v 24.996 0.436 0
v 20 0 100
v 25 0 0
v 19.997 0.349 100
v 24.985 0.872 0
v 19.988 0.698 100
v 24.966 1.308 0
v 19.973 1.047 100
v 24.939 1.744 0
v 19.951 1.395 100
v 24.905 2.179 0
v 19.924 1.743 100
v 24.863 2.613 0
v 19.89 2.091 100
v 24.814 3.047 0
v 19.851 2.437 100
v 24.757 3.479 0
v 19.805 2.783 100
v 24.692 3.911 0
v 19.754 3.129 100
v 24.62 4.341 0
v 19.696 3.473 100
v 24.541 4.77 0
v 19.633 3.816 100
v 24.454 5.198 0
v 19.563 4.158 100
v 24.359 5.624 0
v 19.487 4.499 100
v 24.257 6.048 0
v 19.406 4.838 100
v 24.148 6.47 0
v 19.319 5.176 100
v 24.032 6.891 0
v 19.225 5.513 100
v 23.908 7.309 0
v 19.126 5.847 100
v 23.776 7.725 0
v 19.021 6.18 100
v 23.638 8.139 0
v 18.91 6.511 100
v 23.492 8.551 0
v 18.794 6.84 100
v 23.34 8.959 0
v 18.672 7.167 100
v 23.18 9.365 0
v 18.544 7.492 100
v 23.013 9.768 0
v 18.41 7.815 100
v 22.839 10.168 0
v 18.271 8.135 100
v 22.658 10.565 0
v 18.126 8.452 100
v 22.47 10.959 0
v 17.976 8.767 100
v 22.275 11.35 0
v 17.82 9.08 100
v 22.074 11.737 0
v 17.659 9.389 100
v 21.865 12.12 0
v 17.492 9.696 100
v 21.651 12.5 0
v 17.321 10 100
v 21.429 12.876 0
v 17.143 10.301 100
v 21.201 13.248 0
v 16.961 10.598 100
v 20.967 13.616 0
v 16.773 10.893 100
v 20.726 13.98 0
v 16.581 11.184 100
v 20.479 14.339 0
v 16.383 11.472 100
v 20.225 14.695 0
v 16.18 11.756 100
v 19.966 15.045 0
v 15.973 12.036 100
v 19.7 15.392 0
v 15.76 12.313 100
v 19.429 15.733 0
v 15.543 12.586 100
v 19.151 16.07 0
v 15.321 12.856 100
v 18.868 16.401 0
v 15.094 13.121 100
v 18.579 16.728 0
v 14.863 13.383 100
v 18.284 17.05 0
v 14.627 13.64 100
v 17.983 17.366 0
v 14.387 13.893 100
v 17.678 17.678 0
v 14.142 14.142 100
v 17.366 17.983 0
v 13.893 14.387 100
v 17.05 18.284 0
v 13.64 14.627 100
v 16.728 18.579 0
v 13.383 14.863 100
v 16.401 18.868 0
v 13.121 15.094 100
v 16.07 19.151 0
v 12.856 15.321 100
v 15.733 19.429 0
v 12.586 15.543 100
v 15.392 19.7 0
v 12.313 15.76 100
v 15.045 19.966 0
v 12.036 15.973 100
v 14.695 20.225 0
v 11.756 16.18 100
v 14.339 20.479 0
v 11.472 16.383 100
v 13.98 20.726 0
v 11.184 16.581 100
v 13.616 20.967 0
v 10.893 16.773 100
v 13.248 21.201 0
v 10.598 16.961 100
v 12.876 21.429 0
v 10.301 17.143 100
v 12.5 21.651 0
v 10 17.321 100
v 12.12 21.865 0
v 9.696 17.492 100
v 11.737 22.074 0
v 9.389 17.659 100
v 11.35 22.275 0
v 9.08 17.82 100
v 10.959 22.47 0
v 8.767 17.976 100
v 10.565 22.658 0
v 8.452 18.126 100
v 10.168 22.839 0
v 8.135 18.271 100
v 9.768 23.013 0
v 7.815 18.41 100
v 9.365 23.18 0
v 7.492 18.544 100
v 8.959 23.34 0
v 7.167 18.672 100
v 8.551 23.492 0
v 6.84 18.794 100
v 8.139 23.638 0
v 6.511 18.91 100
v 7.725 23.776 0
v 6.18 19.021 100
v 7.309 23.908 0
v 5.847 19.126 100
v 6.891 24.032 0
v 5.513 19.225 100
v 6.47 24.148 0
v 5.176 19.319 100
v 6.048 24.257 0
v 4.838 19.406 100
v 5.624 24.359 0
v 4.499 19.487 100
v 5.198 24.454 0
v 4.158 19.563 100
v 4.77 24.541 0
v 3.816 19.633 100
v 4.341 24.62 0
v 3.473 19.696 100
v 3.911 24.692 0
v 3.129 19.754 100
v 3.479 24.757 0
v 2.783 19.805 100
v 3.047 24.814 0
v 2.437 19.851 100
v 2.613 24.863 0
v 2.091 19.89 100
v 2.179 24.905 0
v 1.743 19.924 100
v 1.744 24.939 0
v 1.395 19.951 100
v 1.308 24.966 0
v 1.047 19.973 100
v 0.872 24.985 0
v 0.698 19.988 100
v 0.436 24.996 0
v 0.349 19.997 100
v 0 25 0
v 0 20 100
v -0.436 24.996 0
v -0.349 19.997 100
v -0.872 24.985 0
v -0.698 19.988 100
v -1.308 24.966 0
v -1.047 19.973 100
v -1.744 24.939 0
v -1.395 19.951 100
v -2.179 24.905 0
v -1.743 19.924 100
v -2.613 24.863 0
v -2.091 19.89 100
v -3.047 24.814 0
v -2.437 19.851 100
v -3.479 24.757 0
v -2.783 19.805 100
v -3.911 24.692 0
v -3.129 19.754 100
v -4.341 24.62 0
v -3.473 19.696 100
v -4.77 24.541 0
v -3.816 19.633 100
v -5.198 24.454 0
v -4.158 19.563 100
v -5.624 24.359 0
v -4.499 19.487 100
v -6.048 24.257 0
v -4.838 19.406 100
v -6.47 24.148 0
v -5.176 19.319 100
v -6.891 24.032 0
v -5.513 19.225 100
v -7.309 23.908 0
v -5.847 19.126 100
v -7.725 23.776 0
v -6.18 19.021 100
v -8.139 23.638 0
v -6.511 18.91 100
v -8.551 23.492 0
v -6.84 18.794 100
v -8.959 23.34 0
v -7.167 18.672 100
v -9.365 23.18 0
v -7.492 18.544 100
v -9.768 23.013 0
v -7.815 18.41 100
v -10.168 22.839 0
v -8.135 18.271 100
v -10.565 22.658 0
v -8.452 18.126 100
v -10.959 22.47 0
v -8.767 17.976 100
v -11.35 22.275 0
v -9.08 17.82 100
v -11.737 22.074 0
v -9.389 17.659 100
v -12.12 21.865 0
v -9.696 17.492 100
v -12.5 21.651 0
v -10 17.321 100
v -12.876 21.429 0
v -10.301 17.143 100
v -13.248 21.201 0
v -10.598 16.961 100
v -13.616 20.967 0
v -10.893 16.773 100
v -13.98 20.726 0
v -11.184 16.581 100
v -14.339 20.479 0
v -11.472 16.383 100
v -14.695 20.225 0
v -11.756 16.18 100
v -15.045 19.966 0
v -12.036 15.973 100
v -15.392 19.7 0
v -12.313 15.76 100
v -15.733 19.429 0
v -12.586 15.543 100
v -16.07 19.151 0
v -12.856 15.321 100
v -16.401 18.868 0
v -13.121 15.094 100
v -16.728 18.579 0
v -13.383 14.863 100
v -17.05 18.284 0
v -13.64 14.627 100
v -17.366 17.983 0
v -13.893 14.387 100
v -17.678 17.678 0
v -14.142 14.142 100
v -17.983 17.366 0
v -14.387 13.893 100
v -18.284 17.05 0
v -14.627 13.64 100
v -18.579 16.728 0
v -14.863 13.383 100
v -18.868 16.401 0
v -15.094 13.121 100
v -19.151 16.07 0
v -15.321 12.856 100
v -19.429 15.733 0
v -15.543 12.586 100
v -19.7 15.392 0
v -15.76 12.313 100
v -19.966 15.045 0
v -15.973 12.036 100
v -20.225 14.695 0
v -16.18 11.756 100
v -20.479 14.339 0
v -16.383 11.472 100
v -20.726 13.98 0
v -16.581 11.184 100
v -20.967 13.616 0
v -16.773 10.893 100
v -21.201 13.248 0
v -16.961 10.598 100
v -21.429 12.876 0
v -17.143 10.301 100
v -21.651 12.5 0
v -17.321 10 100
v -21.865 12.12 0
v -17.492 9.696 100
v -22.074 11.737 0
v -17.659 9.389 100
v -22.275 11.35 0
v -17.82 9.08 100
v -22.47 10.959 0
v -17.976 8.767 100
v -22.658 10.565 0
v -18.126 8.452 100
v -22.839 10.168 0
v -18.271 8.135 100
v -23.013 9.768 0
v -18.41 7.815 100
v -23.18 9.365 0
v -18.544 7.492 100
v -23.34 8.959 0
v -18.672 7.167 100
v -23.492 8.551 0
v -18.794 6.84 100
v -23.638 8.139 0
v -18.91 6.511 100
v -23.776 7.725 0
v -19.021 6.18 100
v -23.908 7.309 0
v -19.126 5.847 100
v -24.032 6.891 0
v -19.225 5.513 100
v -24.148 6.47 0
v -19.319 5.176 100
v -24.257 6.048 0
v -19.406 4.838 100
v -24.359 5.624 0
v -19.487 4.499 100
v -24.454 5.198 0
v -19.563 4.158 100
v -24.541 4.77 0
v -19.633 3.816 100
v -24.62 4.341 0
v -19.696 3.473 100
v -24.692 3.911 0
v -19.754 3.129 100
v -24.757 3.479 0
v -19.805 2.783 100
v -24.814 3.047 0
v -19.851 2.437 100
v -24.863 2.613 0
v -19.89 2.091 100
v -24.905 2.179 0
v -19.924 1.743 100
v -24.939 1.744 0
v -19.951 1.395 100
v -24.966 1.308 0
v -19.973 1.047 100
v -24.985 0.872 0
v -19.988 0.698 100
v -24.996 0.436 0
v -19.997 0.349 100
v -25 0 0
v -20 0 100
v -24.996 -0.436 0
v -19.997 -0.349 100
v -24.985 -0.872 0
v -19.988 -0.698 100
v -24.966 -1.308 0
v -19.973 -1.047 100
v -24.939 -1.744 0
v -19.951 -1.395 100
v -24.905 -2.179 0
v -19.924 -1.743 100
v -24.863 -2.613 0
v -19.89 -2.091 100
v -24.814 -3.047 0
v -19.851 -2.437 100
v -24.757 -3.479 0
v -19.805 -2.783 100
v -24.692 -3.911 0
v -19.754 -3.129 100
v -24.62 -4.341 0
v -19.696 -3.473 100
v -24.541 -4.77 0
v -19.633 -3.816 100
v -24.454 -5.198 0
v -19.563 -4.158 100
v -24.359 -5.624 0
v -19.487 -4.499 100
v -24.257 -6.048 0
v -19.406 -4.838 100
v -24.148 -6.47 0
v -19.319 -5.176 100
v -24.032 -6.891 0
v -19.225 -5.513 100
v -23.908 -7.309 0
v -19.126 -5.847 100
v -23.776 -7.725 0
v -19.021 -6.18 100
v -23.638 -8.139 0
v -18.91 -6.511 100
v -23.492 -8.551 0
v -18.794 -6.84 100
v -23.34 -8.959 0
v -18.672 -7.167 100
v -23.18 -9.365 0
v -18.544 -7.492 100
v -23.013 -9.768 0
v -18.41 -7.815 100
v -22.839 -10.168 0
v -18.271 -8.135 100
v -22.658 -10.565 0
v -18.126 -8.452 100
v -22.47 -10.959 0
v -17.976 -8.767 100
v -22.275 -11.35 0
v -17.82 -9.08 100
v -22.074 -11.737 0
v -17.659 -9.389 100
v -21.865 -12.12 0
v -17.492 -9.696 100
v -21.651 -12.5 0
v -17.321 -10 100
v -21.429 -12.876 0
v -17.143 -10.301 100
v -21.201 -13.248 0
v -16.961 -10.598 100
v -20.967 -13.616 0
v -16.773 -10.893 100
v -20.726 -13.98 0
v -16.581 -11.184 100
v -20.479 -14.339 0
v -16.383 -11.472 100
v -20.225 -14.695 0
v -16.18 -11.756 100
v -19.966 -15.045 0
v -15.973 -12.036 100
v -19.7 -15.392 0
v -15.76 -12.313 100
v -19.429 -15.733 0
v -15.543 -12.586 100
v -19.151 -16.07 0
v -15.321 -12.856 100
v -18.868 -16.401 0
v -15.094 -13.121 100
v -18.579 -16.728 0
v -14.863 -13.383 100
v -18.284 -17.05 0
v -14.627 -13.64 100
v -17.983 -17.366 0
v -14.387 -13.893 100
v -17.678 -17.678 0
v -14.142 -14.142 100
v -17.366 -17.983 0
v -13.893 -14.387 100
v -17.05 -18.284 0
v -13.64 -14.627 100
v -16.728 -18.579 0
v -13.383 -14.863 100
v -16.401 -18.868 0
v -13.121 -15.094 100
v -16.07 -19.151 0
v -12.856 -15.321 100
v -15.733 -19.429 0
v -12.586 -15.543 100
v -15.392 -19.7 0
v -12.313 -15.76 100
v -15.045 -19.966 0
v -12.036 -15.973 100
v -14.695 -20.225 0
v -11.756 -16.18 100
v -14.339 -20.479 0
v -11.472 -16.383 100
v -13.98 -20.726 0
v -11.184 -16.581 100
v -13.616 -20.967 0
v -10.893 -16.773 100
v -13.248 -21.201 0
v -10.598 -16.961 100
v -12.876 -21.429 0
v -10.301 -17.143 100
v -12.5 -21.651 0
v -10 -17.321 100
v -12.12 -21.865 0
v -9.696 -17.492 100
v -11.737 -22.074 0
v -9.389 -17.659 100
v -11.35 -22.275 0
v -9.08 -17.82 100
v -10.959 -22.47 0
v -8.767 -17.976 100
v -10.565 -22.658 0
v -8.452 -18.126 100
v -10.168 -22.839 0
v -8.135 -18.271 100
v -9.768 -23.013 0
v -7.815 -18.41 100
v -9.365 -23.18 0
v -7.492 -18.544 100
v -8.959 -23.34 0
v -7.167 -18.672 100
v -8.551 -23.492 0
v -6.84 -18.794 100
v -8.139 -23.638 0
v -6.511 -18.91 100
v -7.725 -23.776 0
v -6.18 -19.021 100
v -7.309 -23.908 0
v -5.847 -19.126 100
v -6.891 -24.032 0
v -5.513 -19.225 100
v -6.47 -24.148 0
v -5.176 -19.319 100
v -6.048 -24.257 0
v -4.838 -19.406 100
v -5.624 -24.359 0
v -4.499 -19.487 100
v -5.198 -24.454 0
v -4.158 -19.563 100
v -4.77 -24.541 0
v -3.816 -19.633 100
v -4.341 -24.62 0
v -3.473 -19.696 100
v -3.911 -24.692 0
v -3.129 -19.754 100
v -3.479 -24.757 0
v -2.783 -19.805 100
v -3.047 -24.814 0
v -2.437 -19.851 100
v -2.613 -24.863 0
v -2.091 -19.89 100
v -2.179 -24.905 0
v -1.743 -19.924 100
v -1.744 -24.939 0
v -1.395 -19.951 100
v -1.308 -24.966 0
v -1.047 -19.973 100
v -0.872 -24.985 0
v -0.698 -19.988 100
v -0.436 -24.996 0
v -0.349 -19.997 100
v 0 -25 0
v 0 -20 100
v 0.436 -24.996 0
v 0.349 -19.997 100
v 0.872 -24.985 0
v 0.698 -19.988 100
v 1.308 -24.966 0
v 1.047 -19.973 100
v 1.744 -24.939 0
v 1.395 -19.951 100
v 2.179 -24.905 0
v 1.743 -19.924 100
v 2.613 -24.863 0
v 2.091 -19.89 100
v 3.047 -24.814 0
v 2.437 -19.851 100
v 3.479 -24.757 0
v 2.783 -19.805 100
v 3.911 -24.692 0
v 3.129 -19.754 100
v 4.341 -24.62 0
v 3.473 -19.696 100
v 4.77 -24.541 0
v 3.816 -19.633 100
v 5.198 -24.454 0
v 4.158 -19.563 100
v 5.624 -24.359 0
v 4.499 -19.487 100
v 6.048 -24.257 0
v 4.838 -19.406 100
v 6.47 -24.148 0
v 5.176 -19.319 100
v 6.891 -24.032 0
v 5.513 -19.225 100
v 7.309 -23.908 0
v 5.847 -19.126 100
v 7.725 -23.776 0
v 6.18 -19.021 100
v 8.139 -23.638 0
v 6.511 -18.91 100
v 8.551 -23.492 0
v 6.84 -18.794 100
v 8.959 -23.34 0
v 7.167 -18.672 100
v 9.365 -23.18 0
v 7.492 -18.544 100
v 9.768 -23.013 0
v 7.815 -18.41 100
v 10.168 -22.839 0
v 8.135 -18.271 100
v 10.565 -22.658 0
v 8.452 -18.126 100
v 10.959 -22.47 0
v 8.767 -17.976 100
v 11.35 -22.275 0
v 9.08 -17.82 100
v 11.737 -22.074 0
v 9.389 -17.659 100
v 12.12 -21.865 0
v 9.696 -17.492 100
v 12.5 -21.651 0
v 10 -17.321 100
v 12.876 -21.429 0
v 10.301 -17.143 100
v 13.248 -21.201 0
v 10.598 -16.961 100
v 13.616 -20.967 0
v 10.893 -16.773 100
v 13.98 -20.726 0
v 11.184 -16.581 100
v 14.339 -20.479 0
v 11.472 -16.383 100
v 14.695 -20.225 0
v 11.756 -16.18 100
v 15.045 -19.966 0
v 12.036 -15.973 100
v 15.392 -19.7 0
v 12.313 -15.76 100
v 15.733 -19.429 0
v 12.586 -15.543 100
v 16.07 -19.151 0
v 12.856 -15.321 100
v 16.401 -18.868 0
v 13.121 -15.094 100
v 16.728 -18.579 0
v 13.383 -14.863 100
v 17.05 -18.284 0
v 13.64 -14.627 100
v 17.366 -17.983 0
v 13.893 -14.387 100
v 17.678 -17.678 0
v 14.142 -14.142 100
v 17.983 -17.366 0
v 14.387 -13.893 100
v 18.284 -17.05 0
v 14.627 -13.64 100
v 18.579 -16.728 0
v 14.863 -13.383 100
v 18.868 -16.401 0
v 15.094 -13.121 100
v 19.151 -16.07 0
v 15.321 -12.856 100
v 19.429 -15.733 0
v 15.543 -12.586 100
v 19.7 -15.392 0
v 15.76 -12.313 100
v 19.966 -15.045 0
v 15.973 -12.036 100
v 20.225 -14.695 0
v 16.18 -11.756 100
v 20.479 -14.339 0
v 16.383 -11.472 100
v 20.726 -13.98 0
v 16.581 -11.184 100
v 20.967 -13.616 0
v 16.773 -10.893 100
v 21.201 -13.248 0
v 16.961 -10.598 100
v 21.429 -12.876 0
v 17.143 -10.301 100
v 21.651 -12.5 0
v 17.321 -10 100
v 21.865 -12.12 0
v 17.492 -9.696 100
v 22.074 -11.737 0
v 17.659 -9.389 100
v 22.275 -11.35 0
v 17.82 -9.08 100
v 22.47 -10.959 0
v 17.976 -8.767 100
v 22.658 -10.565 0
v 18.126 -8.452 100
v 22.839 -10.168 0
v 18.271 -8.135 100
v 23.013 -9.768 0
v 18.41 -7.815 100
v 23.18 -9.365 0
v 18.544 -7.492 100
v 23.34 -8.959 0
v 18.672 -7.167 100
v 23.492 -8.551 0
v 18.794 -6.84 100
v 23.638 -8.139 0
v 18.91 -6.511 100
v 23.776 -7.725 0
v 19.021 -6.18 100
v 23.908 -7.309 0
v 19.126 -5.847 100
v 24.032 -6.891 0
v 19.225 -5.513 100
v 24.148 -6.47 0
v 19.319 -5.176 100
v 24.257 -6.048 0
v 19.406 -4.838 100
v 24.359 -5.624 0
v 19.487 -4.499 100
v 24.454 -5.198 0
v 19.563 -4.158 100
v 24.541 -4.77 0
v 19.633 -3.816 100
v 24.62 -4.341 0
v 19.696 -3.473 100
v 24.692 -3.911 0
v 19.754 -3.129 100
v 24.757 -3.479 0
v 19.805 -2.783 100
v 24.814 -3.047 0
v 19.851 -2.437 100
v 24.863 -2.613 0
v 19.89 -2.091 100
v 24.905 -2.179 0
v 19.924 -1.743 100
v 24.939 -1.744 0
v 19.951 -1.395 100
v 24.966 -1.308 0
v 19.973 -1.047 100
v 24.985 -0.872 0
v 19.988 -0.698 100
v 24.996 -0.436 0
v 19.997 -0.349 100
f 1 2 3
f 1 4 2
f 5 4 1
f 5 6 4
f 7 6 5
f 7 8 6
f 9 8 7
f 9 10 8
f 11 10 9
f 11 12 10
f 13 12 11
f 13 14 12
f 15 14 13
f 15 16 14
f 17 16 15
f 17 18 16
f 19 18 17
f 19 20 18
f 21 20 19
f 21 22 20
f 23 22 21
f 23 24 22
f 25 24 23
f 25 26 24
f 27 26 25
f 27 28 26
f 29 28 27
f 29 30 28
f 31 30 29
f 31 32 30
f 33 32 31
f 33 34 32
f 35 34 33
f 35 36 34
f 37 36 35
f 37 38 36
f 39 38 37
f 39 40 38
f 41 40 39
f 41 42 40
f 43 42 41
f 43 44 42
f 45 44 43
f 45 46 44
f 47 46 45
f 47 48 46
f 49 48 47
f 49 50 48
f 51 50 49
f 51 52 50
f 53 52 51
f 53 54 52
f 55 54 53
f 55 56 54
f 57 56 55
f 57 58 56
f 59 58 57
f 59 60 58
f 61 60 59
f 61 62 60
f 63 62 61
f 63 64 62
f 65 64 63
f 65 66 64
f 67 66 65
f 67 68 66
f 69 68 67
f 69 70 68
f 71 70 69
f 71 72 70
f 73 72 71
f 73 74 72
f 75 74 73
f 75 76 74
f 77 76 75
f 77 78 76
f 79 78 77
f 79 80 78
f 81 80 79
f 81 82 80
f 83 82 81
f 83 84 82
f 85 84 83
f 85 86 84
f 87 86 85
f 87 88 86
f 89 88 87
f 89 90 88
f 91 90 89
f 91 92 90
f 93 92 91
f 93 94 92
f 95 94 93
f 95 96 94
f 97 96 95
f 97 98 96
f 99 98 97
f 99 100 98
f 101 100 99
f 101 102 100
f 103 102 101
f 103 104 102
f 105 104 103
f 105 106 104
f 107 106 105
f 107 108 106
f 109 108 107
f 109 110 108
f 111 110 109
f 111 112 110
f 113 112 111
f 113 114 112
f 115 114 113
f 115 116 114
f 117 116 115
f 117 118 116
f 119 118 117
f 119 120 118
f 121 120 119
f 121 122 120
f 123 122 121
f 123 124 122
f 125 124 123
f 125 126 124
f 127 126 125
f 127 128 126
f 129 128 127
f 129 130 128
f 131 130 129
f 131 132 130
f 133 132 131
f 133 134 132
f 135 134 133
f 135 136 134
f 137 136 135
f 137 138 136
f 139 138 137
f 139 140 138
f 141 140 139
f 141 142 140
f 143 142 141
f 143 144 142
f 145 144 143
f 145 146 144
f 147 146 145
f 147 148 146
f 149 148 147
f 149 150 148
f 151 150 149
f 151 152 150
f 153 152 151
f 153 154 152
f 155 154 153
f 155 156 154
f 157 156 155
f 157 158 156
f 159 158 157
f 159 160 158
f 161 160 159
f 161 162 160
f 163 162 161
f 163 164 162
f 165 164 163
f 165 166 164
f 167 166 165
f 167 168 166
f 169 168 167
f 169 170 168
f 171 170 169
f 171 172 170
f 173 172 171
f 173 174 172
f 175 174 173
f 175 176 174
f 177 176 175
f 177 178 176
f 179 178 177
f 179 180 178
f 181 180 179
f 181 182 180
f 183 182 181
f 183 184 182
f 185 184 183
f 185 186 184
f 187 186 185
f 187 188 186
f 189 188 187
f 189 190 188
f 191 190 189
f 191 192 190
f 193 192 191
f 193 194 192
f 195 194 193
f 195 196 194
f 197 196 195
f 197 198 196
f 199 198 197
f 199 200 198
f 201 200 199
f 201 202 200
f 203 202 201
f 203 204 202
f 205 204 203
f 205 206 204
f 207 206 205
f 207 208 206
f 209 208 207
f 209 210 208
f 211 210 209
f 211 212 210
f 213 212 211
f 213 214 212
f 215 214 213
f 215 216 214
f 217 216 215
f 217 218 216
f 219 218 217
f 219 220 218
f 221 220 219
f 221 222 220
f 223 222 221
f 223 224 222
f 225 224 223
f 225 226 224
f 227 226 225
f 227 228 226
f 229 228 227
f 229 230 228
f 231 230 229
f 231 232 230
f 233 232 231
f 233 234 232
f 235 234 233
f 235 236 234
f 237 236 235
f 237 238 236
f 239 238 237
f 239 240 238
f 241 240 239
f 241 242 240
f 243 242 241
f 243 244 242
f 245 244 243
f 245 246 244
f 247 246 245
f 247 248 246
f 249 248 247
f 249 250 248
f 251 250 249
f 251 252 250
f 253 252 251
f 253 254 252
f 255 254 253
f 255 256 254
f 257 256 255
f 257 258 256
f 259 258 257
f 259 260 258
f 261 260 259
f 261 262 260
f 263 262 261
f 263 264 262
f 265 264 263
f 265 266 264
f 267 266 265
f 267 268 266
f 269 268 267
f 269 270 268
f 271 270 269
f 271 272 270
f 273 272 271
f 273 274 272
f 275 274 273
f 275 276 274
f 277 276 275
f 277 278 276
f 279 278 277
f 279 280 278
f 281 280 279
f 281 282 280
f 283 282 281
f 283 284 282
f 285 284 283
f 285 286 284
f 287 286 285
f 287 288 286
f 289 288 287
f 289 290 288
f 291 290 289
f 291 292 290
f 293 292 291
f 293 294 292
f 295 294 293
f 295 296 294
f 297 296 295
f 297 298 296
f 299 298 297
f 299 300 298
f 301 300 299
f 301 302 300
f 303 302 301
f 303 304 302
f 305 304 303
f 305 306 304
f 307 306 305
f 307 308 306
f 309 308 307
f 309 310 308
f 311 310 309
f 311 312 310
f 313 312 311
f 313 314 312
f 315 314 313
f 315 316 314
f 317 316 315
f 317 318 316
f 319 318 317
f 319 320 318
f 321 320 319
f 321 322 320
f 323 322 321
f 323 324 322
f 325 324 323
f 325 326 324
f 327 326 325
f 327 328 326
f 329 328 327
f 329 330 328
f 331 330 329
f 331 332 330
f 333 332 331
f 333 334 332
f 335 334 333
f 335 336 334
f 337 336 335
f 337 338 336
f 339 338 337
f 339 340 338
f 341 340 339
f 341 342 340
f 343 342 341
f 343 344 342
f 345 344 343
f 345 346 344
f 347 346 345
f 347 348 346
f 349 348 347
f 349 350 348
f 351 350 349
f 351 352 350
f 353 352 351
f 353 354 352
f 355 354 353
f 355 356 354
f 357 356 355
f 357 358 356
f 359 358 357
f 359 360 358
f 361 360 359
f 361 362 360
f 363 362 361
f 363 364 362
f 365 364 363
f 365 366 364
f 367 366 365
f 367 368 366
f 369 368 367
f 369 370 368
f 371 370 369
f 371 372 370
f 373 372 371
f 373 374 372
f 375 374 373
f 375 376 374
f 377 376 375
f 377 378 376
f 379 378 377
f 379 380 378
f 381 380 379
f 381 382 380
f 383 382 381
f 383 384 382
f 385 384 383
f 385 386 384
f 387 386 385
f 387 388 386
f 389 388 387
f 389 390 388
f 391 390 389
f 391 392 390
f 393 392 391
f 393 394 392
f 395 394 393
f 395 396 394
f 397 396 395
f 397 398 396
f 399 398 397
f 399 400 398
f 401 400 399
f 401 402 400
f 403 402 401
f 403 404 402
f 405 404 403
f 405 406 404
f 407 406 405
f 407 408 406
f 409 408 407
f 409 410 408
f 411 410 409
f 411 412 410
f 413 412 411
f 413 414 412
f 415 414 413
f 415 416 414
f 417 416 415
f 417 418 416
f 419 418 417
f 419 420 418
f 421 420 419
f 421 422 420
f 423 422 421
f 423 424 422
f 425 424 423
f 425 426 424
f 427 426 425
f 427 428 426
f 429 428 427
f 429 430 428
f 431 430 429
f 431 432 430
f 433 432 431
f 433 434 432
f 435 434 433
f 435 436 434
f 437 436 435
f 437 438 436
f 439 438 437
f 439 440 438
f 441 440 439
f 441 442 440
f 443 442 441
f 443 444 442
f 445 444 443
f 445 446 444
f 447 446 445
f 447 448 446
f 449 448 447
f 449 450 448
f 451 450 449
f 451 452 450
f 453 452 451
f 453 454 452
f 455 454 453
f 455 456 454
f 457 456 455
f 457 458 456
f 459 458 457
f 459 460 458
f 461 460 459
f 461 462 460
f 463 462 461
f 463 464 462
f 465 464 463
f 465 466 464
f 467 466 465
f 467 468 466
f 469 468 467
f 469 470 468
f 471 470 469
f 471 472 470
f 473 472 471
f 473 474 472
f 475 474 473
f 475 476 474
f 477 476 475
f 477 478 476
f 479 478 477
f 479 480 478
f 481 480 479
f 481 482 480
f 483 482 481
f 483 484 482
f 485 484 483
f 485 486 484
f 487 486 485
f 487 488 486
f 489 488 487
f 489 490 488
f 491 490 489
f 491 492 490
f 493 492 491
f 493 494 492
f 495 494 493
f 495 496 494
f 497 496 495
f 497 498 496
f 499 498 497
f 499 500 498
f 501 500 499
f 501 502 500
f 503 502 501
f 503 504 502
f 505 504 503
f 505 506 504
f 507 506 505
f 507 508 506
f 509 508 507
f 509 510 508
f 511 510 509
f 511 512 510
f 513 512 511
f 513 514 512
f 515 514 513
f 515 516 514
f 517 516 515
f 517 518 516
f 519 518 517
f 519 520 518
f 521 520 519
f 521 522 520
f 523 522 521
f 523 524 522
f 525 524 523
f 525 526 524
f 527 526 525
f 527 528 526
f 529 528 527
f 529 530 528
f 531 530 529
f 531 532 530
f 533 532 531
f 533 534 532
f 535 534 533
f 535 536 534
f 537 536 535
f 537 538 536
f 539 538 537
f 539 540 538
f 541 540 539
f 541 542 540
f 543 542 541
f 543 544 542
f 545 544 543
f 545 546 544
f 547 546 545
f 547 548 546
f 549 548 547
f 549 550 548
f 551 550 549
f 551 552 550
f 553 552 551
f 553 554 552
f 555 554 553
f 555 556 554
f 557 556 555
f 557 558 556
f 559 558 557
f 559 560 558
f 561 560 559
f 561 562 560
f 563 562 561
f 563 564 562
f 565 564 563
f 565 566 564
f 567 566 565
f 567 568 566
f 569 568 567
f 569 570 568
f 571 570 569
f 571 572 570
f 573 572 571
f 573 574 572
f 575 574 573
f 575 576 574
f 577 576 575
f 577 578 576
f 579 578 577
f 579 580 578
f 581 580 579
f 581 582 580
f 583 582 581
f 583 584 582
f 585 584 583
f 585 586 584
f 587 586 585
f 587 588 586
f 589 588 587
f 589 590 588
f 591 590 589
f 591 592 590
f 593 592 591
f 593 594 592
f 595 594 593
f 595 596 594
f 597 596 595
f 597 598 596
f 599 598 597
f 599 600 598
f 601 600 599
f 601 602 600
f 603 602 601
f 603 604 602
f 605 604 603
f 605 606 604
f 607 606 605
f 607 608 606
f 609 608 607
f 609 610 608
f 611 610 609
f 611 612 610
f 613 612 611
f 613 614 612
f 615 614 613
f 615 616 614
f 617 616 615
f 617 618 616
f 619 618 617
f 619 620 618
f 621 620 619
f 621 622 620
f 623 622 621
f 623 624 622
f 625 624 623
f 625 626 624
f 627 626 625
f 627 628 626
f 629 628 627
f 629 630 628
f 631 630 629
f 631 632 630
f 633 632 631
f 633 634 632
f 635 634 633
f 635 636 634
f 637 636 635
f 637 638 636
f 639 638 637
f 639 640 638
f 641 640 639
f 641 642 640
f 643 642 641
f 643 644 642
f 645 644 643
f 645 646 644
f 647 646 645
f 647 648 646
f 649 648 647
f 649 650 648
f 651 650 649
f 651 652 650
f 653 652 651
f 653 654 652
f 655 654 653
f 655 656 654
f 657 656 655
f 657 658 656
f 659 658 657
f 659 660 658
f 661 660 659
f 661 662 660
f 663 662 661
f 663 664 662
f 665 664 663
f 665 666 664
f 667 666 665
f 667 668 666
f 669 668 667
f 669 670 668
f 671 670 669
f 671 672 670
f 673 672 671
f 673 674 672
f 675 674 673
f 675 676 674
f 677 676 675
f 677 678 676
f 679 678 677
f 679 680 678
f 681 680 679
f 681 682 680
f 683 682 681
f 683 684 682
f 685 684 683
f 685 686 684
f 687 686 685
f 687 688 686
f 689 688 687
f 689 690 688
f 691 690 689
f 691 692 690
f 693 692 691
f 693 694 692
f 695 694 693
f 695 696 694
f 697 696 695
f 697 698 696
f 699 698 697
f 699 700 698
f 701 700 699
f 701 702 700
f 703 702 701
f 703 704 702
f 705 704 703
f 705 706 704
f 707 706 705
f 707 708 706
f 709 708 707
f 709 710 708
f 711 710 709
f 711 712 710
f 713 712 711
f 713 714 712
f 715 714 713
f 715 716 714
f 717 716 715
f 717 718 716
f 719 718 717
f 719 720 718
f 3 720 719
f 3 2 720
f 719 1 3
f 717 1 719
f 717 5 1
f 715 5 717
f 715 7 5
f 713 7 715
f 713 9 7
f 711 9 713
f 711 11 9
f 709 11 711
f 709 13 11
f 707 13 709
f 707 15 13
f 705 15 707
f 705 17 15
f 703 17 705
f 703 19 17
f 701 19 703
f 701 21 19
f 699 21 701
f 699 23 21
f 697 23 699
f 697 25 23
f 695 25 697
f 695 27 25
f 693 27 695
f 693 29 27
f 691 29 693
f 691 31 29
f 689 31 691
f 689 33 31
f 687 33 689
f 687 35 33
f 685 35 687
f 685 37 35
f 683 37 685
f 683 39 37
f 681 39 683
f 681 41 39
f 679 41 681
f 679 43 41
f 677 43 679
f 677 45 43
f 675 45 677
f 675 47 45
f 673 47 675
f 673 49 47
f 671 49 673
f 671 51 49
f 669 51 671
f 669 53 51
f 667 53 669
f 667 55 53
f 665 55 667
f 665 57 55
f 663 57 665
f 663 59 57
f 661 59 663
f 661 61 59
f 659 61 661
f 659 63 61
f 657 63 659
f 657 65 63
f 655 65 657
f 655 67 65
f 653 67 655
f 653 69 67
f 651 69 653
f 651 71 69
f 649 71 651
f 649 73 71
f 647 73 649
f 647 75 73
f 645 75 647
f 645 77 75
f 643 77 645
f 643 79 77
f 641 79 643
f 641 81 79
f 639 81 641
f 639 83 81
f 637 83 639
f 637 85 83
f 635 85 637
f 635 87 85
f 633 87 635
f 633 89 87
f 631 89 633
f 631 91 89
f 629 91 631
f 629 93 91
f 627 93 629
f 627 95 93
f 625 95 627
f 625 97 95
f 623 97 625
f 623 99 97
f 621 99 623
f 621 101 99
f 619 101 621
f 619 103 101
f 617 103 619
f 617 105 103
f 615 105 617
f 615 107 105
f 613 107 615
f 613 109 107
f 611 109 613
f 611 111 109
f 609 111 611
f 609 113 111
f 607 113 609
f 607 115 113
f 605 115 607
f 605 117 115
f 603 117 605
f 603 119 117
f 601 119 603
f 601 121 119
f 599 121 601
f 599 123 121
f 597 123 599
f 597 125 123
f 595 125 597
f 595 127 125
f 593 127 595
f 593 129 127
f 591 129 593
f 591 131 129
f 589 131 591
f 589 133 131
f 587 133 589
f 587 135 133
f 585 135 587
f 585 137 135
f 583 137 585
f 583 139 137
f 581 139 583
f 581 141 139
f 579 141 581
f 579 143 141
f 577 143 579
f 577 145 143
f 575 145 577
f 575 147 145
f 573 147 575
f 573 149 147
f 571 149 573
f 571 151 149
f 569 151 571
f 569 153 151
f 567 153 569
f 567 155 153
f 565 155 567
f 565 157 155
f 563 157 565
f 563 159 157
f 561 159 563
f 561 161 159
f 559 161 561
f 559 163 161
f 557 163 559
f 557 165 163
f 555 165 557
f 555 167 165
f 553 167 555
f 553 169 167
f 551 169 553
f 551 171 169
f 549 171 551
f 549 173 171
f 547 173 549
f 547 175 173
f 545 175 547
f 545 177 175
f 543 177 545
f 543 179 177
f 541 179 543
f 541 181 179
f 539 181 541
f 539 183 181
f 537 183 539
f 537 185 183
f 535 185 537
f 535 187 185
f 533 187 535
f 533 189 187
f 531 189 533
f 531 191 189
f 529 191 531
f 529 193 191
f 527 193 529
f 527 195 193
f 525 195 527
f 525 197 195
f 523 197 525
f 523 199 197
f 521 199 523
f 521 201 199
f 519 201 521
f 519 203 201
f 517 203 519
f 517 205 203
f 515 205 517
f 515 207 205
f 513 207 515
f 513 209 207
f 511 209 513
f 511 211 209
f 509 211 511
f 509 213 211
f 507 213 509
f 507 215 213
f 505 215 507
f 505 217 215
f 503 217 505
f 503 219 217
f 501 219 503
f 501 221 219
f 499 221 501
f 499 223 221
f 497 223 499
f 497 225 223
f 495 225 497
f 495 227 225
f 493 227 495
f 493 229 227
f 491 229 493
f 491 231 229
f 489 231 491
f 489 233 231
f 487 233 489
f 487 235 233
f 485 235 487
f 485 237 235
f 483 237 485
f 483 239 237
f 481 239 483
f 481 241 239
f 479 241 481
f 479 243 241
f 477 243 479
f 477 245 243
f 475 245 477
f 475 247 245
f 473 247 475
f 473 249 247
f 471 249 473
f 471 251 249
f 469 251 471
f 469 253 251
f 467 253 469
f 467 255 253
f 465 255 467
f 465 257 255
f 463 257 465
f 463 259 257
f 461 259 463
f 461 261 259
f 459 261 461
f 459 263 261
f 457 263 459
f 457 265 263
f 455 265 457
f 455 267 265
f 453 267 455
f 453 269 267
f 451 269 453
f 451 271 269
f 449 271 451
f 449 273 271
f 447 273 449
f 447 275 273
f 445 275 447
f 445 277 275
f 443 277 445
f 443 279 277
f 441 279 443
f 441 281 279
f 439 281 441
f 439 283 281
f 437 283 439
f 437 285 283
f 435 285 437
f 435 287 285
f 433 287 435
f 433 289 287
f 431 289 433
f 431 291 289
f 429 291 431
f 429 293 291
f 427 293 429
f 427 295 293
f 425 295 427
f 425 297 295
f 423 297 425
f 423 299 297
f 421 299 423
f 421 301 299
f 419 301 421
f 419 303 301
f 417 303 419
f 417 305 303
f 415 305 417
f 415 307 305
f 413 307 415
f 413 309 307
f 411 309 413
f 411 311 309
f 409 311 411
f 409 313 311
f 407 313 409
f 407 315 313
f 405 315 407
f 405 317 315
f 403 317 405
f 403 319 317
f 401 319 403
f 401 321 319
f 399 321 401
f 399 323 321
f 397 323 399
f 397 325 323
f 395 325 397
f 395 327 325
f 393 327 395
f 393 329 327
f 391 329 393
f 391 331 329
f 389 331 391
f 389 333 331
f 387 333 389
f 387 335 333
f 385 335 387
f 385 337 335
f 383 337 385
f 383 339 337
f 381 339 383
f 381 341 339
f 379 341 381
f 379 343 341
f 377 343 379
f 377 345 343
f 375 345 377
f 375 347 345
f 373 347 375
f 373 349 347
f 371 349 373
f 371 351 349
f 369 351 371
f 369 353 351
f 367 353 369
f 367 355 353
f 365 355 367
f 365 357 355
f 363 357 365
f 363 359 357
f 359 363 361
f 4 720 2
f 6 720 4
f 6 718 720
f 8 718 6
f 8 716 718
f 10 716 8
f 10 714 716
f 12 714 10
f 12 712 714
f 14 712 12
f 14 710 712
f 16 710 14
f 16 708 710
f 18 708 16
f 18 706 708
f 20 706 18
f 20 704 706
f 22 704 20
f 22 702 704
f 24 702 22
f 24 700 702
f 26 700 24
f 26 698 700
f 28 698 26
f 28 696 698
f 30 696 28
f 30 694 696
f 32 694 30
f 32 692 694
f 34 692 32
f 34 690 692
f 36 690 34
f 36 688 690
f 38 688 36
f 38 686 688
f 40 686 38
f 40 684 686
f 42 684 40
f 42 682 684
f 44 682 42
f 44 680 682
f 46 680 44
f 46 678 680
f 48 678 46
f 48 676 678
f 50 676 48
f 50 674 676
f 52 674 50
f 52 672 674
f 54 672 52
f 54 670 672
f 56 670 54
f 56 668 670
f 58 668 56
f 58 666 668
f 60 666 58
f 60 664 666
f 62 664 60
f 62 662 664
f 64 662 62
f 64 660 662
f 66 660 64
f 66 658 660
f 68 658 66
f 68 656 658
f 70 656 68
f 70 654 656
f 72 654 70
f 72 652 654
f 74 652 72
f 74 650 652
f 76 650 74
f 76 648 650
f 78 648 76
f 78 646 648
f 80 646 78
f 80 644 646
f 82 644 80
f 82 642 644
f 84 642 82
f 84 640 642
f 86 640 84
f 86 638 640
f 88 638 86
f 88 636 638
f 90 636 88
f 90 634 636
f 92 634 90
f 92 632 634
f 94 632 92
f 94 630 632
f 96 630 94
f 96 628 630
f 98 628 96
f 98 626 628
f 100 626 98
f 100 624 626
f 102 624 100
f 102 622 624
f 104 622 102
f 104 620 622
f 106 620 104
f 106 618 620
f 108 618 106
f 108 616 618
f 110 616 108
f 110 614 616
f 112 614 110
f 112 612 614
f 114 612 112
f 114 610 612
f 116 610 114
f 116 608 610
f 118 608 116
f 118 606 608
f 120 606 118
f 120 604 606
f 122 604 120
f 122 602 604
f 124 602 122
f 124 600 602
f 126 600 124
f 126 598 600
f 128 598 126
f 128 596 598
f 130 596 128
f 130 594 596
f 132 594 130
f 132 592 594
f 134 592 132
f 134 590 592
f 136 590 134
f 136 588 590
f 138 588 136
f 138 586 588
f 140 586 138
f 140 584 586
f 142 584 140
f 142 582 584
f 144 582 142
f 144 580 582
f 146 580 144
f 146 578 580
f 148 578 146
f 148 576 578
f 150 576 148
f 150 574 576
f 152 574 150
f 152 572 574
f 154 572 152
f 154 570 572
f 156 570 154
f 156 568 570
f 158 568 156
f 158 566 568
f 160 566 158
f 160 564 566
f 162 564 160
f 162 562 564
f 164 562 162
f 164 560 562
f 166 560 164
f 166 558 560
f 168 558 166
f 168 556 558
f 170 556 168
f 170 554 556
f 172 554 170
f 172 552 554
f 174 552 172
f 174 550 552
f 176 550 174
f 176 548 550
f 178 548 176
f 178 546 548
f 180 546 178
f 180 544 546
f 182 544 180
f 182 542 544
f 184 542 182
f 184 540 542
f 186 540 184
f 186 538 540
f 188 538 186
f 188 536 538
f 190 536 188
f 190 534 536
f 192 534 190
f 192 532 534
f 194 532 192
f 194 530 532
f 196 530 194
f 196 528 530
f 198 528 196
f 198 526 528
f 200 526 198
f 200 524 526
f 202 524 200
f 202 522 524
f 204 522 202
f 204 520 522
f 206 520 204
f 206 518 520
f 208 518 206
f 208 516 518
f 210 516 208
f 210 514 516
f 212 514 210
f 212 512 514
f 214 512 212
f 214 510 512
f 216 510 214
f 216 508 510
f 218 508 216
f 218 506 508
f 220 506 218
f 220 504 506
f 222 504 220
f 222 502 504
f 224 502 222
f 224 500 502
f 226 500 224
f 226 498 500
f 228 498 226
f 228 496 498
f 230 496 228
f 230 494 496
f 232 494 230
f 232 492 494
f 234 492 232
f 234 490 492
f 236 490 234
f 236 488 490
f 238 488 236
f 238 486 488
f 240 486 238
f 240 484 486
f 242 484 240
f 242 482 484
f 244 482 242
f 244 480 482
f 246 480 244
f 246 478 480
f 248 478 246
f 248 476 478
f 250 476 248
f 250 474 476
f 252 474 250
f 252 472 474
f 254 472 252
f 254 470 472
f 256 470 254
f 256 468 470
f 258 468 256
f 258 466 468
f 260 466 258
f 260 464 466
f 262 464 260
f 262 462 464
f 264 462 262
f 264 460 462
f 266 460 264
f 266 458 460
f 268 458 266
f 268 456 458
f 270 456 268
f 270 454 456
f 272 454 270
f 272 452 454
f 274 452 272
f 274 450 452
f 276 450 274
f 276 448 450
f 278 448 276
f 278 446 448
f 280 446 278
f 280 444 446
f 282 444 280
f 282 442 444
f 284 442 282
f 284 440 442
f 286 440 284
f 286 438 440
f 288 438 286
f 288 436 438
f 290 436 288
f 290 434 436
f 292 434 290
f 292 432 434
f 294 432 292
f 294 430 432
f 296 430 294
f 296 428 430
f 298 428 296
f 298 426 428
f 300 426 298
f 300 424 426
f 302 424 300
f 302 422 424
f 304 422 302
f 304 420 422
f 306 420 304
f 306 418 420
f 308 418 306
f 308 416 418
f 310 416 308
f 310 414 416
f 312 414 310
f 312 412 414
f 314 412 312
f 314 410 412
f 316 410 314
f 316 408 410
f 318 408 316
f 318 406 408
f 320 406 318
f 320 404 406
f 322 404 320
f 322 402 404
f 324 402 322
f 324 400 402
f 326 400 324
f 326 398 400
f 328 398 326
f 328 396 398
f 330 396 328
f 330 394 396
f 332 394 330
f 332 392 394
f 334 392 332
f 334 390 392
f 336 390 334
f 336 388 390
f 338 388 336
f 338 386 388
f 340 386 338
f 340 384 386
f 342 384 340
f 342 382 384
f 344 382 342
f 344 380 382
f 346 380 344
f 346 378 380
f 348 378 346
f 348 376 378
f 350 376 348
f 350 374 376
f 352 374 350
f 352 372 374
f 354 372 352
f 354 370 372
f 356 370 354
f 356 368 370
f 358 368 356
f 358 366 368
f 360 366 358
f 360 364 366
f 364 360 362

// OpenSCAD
// Unit of length: Unit.INCH
cylinder(h = 100.0, d1 = 50.0, d2 = 40.0, center = false, $fn = 360);
